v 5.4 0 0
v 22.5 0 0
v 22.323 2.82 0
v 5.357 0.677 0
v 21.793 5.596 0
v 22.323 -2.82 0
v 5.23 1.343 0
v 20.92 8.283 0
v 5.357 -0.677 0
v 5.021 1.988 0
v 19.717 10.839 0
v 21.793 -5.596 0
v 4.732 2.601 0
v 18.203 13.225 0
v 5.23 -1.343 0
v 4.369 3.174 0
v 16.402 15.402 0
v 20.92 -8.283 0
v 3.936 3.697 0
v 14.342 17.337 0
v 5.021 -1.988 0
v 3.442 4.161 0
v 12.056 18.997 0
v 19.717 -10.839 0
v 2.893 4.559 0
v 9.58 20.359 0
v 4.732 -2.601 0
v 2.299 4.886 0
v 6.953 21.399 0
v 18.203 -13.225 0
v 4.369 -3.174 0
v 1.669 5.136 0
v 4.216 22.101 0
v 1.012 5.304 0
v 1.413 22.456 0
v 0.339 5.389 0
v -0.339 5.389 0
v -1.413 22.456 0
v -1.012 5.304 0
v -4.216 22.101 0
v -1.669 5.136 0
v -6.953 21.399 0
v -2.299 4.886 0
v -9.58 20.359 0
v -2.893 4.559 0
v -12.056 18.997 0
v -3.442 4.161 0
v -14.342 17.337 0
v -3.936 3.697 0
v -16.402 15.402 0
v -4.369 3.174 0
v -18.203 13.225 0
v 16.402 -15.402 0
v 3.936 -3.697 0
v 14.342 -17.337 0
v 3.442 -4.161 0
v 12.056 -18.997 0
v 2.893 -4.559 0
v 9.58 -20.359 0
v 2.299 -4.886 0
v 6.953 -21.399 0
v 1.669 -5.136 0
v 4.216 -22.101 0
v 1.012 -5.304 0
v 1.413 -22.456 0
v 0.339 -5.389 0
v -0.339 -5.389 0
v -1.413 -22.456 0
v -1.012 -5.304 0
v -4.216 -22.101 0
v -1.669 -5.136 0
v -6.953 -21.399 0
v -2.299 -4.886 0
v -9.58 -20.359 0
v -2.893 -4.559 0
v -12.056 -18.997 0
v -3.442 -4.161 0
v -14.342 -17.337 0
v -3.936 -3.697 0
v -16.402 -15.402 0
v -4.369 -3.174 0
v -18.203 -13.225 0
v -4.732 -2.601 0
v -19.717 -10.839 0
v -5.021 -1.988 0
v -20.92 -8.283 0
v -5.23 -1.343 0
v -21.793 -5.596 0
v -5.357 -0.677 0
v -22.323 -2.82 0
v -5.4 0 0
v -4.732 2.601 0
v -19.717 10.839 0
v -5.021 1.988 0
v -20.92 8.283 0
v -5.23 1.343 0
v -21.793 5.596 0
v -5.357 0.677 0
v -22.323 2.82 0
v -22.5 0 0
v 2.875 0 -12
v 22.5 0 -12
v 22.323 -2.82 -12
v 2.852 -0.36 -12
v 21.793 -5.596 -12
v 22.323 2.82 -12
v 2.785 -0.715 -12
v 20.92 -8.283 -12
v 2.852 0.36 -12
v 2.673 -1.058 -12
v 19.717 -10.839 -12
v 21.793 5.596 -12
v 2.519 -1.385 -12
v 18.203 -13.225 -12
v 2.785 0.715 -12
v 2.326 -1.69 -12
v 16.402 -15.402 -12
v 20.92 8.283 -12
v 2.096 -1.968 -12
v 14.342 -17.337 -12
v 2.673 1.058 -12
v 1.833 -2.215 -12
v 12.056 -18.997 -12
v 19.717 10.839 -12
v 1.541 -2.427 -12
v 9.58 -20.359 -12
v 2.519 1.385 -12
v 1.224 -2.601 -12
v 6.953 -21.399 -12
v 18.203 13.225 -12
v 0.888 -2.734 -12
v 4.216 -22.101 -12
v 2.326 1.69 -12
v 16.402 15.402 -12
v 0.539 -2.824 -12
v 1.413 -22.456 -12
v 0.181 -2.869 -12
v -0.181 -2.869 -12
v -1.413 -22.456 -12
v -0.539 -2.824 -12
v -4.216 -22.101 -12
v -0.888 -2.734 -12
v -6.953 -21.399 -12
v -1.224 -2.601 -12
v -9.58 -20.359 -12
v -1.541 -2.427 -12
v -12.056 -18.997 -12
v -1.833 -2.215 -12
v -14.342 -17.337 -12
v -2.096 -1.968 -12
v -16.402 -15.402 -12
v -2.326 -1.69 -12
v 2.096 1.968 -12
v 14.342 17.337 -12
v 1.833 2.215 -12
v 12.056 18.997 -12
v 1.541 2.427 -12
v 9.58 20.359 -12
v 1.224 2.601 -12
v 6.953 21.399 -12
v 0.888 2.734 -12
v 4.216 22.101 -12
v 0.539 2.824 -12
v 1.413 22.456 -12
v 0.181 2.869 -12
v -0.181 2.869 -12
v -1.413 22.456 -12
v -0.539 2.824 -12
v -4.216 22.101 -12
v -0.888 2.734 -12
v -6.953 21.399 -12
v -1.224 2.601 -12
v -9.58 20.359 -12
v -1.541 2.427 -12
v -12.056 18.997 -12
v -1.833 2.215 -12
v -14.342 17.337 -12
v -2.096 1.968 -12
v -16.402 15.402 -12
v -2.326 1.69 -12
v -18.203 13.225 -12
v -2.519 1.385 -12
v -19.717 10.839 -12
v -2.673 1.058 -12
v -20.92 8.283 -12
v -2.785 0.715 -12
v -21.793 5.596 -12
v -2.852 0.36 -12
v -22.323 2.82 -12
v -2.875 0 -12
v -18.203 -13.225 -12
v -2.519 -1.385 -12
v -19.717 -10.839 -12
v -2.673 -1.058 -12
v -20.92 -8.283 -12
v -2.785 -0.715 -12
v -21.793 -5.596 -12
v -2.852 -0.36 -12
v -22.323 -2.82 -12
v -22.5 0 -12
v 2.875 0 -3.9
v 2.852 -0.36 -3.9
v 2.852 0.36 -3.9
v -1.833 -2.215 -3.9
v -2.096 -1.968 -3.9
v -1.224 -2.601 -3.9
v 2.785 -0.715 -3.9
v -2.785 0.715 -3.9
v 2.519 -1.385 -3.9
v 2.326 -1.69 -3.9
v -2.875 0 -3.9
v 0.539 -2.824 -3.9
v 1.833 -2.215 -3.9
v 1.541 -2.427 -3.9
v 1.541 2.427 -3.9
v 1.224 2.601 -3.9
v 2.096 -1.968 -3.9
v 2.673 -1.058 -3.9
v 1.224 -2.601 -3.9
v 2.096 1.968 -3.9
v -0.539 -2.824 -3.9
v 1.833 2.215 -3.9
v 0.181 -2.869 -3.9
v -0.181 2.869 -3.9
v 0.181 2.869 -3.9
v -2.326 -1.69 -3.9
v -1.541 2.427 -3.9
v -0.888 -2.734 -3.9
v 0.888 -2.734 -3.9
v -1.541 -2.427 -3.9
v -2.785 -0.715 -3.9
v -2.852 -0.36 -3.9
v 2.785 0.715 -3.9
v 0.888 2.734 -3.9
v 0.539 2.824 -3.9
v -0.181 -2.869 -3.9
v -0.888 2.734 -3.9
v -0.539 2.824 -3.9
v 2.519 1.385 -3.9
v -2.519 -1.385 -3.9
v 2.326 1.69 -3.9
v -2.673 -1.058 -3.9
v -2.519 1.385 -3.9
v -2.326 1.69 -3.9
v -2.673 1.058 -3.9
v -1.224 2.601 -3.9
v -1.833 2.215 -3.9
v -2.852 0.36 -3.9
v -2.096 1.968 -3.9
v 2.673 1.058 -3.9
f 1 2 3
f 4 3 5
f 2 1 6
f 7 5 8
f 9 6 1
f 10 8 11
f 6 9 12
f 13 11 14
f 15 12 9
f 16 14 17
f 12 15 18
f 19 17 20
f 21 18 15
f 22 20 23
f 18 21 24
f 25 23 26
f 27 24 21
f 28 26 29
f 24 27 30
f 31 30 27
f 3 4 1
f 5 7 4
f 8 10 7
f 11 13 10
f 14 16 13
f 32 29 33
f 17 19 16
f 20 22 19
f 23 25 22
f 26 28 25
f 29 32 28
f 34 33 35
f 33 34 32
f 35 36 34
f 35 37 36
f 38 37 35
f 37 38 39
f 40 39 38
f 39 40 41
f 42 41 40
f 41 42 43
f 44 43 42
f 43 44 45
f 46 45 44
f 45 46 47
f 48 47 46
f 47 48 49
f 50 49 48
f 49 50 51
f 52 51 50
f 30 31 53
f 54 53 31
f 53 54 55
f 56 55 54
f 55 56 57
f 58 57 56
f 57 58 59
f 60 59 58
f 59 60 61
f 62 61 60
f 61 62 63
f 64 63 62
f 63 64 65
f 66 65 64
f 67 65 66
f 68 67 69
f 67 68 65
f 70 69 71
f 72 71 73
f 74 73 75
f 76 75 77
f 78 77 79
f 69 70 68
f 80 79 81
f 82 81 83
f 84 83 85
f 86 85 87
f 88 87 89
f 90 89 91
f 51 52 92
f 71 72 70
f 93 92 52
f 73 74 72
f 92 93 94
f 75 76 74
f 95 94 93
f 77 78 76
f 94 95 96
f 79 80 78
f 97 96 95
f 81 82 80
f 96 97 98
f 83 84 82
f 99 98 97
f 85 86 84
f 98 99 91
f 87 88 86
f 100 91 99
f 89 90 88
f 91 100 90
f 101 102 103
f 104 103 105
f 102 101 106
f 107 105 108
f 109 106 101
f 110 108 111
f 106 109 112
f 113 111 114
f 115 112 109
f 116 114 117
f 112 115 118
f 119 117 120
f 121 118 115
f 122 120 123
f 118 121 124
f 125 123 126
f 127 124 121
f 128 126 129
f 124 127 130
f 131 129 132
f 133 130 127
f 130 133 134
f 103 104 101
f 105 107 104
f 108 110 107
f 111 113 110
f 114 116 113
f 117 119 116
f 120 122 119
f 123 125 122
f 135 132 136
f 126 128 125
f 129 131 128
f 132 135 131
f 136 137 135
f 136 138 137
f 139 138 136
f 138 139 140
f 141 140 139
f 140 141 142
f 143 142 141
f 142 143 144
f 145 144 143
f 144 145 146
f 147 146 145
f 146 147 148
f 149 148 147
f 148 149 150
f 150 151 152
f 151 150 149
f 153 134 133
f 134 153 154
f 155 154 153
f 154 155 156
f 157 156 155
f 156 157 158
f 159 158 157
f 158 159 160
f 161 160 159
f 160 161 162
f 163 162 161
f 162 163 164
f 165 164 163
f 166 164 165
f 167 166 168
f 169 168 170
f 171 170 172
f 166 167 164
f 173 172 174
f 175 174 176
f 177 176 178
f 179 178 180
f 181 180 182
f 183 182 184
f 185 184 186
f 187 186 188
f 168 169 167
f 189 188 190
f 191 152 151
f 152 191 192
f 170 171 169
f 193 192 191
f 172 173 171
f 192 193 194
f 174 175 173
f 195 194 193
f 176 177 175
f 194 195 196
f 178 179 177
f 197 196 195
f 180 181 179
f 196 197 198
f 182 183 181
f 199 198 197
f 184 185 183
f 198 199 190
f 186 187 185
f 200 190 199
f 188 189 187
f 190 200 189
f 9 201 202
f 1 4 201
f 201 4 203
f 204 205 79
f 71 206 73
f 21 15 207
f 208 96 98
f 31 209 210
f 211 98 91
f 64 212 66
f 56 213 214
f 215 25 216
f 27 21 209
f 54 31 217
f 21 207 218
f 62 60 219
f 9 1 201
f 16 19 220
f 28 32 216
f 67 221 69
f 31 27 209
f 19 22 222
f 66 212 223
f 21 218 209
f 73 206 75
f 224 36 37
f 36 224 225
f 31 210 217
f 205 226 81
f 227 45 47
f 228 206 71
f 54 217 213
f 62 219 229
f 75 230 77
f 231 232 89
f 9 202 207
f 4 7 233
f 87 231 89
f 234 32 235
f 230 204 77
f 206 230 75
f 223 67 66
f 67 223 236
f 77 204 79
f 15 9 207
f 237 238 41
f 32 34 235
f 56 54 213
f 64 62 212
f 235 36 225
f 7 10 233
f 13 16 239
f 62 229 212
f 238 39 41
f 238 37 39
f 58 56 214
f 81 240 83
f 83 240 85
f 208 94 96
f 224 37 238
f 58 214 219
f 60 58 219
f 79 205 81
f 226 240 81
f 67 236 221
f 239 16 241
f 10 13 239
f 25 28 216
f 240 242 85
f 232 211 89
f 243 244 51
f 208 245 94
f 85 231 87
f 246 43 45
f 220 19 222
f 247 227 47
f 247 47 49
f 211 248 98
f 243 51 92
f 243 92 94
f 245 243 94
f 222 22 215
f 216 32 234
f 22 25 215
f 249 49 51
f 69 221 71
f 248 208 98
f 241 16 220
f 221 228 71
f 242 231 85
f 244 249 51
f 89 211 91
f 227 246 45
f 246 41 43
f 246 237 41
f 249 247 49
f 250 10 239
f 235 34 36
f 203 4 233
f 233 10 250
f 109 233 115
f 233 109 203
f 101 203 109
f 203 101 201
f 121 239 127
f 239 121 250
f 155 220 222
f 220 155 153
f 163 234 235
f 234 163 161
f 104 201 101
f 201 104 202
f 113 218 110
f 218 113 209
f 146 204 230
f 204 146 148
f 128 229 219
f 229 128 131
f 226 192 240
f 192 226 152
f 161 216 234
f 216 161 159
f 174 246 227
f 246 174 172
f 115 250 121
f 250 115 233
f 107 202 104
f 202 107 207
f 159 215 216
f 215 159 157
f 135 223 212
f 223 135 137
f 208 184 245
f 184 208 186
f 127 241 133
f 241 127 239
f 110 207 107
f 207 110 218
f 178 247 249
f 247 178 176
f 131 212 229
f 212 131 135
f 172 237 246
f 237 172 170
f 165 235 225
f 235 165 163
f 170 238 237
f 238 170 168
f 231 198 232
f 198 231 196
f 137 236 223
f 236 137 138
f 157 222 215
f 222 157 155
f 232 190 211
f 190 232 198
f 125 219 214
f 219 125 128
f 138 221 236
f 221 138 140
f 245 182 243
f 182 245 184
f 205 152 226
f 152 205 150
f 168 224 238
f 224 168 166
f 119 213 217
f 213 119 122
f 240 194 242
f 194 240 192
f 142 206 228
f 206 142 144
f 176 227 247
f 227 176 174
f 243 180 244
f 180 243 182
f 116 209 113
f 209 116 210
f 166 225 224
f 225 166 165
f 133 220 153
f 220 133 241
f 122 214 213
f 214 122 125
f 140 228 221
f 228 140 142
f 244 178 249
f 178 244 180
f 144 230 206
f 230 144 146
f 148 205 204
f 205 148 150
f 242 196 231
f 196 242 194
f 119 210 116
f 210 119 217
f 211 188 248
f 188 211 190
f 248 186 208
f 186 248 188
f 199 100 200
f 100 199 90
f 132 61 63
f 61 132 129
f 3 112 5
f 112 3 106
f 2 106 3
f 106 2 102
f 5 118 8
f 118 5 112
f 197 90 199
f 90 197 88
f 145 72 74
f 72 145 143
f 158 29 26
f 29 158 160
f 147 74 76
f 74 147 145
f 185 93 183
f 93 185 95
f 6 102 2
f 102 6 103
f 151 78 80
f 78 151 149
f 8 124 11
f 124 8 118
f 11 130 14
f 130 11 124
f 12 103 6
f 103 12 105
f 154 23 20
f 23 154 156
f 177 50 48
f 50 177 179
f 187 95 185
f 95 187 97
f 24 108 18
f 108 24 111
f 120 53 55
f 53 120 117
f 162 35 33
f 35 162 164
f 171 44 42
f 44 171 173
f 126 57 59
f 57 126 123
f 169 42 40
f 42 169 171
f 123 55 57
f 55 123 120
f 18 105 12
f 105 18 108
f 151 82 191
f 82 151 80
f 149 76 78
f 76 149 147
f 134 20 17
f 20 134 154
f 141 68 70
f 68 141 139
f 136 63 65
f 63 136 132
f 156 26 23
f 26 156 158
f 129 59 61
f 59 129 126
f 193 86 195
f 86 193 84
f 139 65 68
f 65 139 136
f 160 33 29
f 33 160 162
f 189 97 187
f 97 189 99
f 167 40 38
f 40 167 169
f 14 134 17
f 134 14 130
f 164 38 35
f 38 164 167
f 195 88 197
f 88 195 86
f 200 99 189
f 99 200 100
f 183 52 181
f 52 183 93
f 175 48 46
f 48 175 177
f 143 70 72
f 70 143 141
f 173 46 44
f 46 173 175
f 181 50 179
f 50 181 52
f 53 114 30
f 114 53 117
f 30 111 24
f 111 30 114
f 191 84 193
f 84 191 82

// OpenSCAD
$fn = 50;


difference() {
	union() {
		translate(v = [0, 0, -12.0000000000]) {
			cylinder(h = 12, r = 22.5000000000);
		}
	}
	union() {
		translate(v = [0, 0, 0]) {
			rotate(a = [0, 0, 0]) {
				difference() {
					union() {
						translate(v = [0, 0, -12.0000000000]) {
							cylinder(h = 12, r = 2.6000000000);
						}
						translate(v = [0, 0, -3.9000000000]) {
							cylinder(h = 3.9000000000, r1 = 2.8750000000, r2 = 5.4000000000);
						}
						translate(v = [0, 0, -12.0000000000]) {
							cylinder(h = 12, r = 2.8750000000);
						}
						translate(v = [0, 0, -12.0000000000]) {
							cylinder(h = 12, r = 2.6000000000);
						}
					}
					union();
				}
			}
		}
	}
}
